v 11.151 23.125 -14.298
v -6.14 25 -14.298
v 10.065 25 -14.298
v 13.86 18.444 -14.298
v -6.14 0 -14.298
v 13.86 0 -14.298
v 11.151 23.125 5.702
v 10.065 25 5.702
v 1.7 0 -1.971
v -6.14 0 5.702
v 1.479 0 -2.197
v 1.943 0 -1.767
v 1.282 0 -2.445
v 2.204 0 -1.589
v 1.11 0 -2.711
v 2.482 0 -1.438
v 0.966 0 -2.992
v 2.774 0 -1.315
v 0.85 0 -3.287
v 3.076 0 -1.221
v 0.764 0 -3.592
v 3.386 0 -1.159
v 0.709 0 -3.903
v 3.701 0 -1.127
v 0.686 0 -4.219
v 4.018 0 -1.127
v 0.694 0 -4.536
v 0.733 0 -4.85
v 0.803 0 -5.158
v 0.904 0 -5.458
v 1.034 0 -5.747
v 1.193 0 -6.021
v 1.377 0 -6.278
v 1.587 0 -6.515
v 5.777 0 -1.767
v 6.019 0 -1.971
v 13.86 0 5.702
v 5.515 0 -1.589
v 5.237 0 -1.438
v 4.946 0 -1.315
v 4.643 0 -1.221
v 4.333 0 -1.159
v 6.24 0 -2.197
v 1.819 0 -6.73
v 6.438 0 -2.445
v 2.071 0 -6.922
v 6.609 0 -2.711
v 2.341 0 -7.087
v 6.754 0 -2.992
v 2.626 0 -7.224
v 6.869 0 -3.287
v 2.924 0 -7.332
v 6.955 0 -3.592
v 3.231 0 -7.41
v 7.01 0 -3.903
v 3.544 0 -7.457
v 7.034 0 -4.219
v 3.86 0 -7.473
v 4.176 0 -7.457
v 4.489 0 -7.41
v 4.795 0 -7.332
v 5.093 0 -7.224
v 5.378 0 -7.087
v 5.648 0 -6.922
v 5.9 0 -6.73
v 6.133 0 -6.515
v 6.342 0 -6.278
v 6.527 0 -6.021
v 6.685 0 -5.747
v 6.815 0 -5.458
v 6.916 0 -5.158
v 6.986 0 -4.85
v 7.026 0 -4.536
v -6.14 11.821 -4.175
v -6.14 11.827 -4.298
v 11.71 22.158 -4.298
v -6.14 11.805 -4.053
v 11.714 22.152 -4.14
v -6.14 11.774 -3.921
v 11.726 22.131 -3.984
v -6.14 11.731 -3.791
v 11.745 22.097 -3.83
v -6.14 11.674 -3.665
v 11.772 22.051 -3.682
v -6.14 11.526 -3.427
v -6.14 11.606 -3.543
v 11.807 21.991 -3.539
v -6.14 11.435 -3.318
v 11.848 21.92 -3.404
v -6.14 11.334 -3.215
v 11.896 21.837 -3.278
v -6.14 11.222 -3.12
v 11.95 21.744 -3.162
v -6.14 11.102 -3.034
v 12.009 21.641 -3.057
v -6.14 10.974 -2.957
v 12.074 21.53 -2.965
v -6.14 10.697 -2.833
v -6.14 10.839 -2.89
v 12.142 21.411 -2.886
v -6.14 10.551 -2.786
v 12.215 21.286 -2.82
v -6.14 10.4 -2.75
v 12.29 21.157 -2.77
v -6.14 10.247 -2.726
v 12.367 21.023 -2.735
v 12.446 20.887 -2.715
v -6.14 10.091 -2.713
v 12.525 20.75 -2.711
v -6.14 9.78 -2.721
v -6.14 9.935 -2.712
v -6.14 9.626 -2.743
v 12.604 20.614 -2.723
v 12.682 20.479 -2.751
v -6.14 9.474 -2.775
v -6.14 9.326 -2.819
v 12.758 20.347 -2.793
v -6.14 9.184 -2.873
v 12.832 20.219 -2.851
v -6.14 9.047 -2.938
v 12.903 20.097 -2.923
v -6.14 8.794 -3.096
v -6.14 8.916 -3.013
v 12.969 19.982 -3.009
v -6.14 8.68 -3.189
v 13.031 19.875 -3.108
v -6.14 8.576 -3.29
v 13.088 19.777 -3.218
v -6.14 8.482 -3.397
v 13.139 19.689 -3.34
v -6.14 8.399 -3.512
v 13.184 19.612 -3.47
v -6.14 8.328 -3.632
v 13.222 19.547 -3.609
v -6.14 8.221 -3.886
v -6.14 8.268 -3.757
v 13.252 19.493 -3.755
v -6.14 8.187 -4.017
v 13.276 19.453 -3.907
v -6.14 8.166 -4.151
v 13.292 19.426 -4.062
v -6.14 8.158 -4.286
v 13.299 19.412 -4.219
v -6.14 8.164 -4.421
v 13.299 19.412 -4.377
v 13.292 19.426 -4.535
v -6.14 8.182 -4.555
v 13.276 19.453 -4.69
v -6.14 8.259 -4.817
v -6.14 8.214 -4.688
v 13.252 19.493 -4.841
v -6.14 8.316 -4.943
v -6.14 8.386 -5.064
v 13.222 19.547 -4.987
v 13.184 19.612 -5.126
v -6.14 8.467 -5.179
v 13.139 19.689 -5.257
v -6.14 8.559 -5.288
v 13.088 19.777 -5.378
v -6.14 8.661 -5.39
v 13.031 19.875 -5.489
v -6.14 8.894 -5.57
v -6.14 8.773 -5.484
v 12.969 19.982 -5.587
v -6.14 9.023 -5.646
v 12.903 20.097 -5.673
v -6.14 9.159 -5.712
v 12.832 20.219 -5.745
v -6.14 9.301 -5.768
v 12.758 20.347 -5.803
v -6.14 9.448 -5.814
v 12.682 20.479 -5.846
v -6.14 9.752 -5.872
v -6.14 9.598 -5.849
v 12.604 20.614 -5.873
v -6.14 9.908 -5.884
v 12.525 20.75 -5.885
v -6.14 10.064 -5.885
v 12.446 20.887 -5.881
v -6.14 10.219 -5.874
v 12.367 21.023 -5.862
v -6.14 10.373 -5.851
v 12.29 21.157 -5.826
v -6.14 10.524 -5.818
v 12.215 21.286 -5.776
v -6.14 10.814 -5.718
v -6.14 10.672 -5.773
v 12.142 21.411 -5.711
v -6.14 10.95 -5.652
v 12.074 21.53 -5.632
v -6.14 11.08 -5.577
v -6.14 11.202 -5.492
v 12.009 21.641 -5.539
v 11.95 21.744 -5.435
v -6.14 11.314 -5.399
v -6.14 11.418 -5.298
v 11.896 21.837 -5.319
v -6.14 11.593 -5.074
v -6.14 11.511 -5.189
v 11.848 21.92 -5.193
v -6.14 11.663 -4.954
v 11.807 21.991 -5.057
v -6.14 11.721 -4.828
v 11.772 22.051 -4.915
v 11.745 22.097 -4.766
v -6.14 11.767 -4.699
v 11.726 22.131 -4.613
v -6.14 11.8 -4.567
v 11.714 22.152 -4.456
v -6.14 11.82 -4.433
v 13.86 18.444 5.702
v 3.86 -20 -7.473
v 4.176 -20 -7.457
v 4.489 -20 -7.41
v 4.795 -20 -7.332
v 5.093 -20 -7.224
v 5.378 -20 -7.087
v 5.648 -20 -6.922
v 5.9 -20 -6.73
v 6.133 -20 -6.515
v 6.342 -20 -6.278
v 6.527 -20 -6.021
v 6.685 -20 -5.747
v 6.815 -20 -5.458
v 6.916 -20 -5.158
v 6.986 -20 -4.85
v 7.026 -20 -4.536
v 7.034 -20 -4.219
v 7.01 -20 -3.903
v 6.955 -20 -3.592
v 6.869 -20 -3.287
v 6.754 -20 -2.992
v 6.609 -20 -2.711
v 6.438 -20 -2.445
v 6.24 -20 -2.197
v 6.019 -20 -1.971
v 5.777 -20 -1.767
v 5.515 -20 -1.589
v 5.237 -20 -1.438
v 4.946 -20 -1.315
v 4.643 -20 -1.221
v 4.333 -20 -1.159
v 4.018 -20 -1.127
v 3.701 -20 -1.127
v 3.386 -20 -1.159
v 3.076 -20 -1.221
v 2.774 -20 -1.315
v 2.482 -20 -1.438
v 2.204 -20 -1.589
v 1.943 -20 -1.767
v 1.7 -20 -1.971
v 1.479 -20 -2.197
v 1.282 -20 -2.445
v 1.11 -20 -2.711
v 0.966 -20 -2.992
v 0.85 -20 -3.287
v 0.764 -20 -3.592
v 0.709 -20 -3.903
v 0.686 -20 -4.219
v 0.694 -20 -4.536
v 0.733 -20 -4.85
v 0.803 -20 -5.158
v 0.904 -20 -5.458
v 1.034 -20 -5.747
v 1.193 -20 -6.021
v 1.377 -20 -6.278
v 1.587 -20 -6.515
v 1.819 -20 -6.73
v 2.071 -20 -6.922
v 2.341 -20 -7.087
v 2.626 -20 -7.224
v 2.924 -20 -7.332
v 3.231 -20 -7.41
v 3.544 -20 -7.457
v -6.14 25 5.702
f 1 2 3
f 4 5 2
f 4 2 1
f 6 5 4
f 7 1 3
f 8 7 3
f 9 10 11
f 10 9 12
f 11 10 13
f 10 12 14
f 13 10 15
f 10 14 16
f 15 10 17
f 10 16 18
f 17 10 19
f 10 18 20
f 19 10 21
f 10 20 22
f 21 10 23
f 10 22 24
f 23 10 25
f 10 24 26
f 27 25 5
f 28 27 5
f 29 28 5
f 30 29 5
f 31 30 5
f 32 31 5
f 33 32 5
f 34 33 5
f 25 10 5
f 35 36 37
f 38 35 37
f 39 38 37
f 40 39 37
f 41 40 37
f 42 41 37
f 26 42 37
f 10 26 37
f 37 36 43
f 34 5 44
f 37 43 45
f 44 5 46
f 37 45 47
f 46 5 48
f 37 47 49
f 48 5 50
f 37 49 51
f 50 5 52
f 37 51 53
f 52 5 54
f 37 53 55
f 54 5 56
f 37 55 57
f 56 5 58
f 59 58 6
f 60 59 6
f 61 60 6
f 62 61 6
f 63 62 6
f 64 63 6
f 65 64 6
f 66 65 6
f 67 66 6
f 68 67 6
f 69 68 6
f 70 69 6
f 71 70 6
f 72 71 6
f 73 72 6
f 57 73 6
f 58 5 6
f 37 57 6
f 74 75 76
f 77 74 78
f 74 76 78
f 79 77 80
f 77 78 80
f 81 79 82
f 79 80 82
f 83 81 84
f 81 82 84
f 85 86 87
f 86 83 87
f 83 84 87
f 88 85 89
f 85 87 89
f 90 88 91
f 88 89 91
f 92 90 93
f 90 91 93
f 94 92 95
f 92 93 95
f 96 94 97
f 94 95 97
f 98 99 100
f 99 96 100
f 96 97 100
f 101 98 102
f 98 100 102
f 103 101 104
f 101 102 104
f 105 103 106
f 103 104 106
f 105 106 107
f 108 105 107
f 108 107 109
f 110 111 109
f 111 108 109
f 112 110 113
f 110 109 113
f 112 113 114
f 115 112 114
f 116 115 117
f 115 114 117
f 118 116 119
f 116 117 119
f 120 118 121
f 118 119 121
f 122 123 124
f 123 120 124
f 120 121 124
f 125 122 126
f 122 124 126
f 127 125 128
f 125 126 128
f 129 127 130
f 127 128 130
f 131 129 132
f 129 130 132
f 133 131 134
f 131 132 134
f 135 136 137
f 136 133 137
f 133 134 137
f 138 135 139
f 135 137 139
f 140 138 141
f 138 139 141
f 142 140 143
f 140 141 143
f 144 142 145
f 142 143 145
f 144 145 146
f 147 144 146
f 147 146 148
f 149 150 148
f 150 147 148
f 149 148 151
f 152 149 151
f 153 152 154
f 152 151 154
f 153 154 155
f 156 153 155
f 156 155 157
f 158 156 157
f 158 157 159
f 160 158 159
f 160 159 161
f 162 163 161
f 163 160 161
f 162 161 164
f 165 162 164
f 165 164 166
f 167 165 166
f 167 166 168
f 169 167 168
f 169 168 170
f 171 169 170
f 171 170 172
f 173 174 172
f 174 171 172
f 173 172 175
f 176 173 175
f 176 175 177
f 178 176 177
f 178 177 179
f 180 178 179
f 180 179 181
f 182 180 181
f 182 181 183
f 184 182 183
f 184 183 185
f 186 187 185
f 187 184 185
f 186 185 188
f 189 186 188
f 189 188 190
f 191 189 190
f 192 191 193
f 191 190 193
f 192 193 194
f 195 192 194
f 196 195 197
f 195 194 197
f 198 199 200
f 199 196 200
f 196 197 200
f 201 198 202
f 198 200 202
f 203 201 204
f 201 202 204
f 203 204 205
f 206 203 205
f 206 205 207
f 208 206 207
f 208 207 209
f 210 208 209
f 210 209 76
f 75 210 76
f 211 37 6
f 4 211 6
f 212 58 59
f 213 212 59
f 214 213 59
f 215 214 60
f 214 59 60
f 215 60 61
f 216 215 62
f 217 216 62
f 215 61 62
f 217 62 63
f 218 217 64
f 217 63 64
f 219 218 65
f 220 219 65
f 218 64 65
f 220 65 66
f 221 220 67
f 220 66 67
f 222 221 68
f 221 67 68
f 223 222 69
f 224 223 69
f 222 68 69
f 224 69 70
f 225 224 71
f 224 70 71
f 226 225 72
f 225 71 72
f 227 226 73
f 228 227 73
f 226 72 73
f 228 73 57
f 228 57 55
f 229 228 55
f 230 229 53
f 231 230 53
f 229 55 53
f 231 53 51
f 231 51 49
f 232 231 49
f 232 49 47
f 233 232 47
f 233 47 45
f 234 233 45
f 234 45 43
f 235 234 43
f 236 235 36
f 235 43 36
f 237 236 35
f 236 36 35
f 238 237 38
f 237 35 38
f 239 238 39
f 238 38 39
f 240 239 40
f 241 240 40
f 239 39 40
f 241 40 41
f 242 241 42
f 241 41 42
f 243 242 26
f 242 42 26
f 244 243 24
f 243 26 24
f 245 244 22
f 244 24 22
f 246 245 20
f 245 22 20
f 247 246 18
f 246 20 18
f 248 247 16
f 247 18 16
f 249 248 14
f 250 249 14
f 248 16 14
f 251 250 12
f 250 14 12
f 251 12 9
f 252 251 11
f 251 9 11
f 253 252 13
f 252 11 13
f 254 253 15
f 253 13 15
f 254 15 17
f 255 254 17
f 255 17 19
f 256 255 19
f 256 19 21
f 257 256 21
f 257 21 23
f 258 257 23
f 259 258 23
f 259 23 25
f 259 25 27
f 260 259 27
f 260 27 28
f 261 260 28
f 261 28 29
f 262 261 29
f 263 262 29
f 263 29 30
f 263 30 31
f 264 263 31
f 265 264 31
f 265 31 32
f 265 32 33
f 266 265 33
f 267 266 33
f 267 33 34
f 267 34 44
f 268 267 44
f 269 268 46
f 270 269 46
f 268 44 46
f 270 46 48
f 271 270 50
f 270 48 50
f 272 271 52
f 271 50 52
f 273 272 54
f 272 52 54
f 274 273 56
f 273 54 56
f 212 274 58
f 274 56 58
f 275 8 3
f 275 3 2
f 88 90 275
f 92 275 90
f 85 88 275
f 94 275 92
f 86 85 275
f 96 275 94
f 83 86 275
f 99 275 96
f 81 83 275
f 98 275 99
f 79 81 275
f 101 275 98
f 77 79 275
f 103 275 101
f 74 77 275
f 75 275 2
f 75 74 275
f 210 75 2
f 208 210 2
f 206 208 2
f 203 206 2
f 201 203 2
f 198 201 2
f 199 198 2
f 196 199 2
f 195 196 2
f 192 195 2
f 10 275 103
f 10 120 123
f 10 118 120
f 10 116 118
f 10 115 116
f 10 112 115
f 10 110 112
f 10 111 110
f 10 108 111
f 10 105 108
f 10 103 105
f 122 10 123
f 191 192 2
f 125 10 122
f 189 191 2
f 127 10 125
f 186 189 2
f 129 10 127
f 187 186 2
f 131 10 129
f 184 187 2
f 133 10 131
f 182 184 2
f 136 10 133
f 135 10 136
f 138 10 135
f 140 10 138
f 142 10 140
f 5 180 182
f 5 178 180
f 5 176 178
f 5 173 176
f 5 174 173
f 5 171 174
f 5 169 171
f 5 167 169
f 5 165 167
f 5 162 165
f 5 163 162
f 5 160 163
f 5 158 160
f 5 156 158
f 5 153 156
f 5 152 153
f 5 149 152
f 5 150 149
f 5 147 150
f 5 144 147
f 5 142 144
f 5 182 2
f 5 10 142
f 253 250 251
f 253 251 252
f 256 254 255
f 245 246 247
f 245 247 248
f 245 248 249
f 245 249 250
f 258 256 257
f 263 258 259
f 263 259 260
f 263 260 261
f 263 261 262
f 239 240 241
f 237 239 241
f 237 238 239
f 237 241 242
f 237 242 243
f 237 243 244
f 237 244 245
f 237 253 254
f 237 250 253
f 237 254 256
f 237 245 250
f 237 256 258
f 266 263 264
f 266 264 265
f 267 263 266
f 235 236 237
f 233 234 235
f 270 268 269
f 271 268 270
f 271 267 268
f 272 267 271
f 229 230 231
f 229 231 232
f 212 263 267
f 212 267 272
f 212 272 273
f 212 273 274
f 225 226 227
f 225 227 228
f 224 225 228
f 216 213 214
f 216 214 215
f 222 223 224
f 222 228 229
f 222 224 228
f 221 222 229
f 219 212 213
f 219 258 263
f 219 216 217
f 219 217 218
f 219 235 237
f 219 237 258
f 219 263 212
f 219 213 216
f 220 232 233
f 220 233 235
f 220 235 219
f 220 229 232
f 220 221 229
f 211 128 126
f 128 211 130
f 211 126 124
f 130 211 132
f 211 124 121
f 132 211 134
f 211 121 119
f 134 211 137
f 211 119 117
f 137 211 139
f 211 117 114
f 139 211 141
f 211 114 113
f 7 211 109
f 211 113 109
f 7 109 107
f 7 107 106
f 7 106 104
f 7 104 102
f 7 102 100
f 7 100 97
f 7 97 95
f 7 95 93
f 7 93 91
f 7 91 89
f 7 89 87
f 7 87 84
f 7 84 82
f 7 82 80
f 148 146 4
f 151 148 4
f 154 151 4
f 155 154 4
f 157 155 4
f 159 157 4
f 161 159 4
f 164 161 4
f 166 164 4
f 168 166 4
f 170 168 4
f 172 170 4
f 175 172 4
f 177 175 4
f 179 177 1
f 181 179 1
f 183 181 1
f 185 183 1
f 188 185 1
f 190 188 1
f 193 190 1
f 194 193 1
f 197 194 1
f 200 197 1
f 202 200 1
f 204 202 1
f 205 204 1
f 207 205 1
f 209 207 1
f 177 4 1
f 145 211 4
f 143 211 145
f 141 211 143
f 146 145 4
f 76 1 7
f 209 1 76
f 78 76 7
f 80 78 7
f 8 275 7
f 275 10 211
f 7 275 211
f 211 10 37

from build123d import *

# Parameters (mm, degrees)
CROQUIS1_W                 = 20
CROQUIS1_H                 = 20
SALIENTE_EXTRUIR1_DEPTH    = 30
CORTAR_EXTRUIR1_DEPTH      = 37.007356213
CORTAR_EXTRUIR1_DEPTH_BACK = 37.007356213
CROQUIS4_R                 = 1.5875
CORTAR_EXTRUIR2_DEPTH      = 30
CROQUIS7_R                 = 3.175
SALIENTE_EXTRUIR2_DEPTH    = 20
CORTAR_EXTRUIR3_DEPTH      = 39.627579186


with BuildPart() as part:
    # Croquis1 → Saliente-Extruir1 (new body)
    with BuildSketch(Plane(origin=(0, 0, 0), x_dir=(1, 0, 0), z_dir=(0, 1, 0))):
        with Locations((3.859649123, 4.298245614)):
            Rectangle(CROQUIS1_W, CROQUIS1_H)
    extrude(amount=SALIENTE_EXTRUIR1_DEPTH)

    # Croquis2 → Cortar-Extruir1 (cut, two sides: drawn at the far end of the back side and taken through both)
    with BuildSketch(Plane.XY.offset(-CORTAR_EXTRUIR1_DEPTH_BACK)):
        Polygon((13.859649123, 24.692447492), (13.859649123, 18.444349321), (11.150769621, 23.124565022), align=None)
    extrude(amount=CORTAR_EXTRUIR1_DEPTH + CORTAR_EXTRUIR1_DEPTH_BACK, mode=Mode.SUBTRACT)

    # Croquis4 → Cortar-Extruir2 (cut)
    with BuildSketch(Plane(origin=(18.37833915, 10.637267462, 0), x_dir=(0, 0, -1), z_dir=(0.8654839376667617, 0.5009366762783868, 0))):
        with Locations(Location((4.298245614, 11.724295816, 0), (0, 0, 90))):
            Circle(CROQUIS4_R)
    extrude(amount=-CORTAR_EXTRUIR2_DEPTH, mode=Mode.SUBTRACT)

    # Croquis7 → Saliente-Extruir2 (add)
    with BuildSketch(Plane.XZ):
        with Locations(Location((3.859649123, -4.298245614, 0), (0, 0, 270))):
            Circle(CROQUIS7_R)
    extrude(amount=SALIENTE_EXTRUIR2_DEPTH)

    # Croquis9 → Cortar-Extruir3 (cut, through all)
    with BuildSketch(Plane.XY.offset(5.701754386)):
        Polygon((10.065279616, 25), (-6.140350877, 25), (-6.140350877, 30), (13.859649123, 30), (13.859649123, 18.444349321), align=None)
    extrude(amount=-CORTAR_EXTRUIR3_DEPTH, mode=Mode.SUBTRACT)


solid = part.part
